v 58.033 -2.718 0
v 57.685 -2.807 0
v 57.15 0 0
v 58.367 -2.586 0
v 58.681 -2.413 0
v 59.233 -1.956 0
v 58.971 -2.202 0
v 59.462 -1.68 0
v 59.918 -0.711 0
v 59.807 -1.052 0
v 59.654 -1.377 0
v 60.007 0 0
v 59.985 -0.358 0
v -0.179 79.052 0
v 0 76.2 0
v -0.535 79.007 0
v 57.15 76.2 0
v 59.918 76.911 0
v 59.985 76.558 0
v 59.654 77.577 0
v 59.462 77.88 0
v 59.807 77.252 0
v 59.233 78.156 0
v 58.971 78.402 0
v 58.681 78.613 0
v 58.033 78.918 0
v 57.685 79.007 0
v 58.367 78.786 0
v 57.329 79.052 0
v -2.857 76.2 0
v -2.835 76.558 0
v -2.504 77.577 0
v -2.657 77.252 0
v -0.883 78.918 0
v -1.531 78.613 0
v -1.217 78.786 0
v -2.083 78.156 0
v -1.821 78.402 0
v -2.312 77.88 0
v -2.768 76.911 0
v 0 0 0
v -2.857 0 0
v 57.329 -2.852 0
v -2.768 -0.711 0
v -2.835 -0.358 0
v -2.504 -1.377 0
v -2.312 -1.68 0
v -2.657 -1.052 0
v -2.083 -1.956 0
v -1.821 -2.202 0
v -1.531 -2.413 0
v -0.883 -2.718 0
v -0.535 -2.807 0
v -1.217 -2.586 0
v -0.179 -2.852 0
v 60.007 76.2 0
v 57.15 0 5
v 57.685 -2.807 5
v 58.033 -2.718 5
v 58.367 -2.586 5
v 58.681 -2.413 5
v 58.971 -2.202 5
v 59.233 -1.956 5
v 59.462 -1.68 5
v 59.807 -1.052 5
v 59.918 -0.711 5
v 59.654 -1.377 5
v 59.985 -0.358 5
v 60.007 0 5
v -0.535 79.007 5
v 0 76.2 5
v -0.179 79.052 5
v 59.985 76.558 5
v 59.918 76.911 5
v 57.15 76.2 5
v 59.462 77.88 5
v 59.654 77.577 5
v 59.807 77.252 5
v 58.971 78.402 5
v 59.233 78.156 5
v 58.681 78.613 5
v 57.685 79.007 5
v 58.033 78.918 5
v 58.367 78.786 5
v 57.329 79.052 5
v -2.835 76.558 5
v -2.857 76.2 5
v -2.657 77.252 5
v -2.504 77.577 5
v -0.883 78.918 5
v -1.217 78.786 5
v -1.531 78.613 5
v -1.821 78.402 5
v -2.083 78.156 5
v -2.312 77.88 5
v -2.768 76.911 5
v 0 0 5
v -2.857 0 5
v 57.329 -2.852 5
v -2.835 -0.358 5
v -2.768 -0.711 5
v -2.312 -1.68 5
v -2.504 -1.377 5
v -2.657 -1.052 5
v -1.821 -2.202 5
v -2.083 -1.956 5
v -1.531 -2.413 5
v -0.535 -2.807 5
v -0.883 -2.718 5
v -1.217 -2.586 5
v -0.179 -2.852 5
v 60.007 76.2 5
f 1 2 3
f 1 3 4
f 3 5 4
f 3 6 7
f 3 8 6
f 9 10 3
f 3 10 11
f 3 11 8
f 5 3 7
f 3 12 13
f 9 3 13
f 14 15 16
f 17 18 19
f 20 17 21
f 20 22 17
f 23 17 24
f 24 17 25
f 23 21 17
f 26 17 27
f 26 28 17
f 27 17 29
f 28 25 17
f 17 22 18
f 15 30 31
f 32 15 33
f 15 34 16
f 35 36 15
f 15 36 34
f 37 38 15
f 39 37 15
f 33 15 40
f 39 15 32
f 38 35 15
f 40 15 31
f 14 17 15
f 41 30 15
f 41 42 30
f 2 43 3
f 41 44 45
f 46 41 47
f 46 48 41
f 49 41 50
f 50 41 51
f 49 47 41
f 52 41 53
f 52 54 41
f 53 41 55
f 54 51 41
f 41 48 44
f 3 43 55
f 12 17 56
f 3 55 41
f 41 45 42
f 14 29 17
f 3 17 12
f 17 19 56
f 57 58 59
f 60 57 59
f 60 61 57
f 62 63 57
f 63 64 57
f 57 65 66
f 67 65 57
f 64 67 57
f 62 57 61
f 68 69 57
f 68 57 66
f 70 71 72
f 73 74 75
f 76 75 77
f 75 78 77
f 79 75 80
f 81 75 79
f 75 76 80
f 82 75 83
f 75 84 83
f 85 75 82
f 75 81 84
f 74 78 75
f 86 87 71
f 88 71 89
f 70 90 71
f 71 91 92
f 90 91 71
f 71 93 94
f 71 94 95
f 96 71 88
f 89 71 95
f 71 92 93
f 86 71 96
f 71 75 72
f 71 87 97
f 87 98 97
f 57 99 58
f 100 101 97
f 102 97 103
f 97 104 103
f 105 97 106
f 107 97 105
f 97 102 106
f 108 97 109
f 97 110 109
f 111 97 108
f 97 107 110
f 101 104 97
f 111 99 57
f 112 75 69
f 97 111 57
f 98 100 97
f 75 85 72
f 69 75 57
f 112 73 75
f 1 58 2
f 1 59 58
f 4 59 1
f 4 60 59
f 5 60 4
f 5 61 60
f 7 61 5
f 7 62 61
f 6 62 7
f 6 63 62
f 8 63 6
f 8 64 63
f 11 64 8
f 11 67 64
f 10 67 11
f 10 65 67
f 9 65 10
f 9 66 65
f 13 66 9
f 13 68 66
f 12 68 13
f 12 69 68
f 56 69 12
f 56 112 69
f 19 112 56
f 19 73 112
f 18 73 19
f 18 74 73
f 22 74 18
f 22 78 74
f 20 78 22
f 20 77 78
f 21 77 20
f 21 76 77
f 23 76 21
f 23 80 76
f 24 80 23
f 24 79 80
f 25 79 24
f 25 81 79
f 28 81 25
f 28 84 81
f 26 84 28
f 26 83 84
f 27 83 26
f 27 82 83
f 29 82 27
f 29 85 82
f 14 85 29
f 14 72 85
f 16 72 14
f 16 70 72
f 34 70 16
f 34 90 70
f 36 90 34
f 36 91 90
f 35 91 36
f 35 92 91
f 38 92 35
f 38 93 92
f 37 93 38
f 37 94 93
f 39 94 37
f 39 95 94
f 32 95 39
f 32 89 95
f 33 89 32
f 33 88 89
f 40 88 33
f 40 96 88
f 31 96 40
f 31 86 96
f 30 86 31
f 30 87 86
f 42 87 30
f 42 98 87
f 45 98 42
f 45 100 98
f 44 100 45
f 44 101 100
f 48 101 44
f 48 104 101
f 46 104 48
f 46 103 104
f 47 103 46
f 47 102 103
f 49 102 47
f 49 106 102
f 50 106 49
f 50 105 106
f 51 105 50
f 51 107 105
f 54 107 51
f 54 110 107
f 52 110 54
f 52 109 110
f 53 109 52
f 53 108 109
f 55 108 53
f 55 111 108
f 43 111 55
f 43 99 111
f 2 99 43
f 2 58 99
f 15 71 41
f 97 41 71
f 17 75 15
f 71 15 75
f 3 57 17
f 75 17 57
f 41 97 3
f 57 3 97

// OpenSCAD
linear_extrude (height=5){
  difference () {
    minkowski () {
      translate ([0, 0, ]) {
        union () {
          translate ([0.0, 0.0, ]) {
            translate ([9.525, 9.525, ]) {
              square ([19.05, 19.05], center=true);
            }
          }
          translate ([19.05, 0.0, ]) {
            translate ([9.525, 9.525, ]) {
              square ([19.05, 19.05], center=true);
            }
          }
          translate ([38.1, 0.0, ]) {
            translate ([9.525, 9.525, ]) {
              square ([19.05, 19.05], center=true);
            }
          }
          translate ([0.0, 19.05, ]) {
            translate ([9.525, 9.525, ]) {
              square ([19.05, 19.05], center=true);
            }
          }
          translate ([19.05, 19.05, ]) {
            translate ([9.525, 9.525, ]) {
              square ([19.05, 19.05], center=true);
            }
          }
          translate ([38.1, 19.05, ]) {
            translate ([9.525, 9.525, ]) {
              square ([19.05, 19.05], center=true);
            }
          }
          translate ([0.0, 38.1, ]) {
            translate ([9.525, 9.525, ]) {
              square ([19.05, 19.05], center=true);
            }
          }
          translate ([19.05, 38.1, ]) {
            translate ([9.525, 9.525, ]) {
              square ([19.05, 19.05], center=true);
            }
          }
          translate ([38.1, 38.1, ]) {
            translate ([9.525, 9.525, ]) {
              square ([19.05, 19.05], center=true);
            }
          }
          translate ([0.0, 57.150000000000006, ]) {
            translate ([9.525, 9.525, ]) {
              square ([19.05, 19.05], center=true);
            }
          }
          translate ([19.05, 57.150000000000006, ]) {
            translate ([9.525, 9.525, ]) {
              square ([19.05, 19.05], center=true);
            }
          }
          translate ([38.1, 57.150000000000006, ]) {
            translate ([9.525, 9.525, ]) {
              square ([19.05, 19.05], center=true);
            }
          }
        }
      }
      circle ($fn=50, r=2.8575);
    }
    translate ([0, 0, ]) {
      union () {
        translate ([0.0, 0.0, ]) {
          translate ([9.525, 9.525, ]) {
            square ([19.05, 19.05], center=true);
          }
        }
        translate ([19.05, 0.0, ]) {
          translate ([9.525, 9.525, ]) {
            square ([19.05, 19.05], center=true);
          }
        }
        translate ([38.1, 0.0, ]) {
          translate ([9.525, 9.525, ]) {
            square ([19.05, 19.05], center=true);
          }
        }
        translate ([0.0, 19.05, ]) {
          translate ([9.525, 9.525, ]) {
            square ([19.05, 19.05], center=true);
          }
        }
        translate ([19.05, 19.05, ]) {
          translate ([9.525, 9.525, ]) {
            square ([19.05, 19.05], center=true);
          }
        }
        translate ([38.1, 19.05, ]) {
          translate ([9.525, 9.525, ]) {
            square ([19.05, 19.05], center=true);
          }
        }
        translate ([0.0, 38.1, ]) {
          translate ([9.525, 9.525, ]) {
            square ([19.05, 19.05], center=true);
          }
        }
        translate ([19.05, 38.1, ]) {
          translate ([9.525, 9.525, ]) {
            square ([19.05, 19.05], center=true);
          }
        }
        translate ([38.1, 38.1, ]) {
          translate ([9.525, 9.525, ]) {
            square ([19.05, 19.05], center=true);
          }
        }
        translate ([0.0, 57.150000000000006, ]) {
          translate ([9.525, 9.525, ]) {
            square ([19.05, 19.05], center=true);
          }
        }
        translate ([19.05, 57.150000000000006, ]) {
          translate ([9.525, 9.525, ]) {
            square ([19.05, 19.05], center=true);
          }
        }
        translate ([38.1, 57.150000000000006, ]) {
          translate ([9.525, 9.525, ]) {
            square ([19.05, 19.05], center=true);
          }
        }
      }
    }
  }
}
